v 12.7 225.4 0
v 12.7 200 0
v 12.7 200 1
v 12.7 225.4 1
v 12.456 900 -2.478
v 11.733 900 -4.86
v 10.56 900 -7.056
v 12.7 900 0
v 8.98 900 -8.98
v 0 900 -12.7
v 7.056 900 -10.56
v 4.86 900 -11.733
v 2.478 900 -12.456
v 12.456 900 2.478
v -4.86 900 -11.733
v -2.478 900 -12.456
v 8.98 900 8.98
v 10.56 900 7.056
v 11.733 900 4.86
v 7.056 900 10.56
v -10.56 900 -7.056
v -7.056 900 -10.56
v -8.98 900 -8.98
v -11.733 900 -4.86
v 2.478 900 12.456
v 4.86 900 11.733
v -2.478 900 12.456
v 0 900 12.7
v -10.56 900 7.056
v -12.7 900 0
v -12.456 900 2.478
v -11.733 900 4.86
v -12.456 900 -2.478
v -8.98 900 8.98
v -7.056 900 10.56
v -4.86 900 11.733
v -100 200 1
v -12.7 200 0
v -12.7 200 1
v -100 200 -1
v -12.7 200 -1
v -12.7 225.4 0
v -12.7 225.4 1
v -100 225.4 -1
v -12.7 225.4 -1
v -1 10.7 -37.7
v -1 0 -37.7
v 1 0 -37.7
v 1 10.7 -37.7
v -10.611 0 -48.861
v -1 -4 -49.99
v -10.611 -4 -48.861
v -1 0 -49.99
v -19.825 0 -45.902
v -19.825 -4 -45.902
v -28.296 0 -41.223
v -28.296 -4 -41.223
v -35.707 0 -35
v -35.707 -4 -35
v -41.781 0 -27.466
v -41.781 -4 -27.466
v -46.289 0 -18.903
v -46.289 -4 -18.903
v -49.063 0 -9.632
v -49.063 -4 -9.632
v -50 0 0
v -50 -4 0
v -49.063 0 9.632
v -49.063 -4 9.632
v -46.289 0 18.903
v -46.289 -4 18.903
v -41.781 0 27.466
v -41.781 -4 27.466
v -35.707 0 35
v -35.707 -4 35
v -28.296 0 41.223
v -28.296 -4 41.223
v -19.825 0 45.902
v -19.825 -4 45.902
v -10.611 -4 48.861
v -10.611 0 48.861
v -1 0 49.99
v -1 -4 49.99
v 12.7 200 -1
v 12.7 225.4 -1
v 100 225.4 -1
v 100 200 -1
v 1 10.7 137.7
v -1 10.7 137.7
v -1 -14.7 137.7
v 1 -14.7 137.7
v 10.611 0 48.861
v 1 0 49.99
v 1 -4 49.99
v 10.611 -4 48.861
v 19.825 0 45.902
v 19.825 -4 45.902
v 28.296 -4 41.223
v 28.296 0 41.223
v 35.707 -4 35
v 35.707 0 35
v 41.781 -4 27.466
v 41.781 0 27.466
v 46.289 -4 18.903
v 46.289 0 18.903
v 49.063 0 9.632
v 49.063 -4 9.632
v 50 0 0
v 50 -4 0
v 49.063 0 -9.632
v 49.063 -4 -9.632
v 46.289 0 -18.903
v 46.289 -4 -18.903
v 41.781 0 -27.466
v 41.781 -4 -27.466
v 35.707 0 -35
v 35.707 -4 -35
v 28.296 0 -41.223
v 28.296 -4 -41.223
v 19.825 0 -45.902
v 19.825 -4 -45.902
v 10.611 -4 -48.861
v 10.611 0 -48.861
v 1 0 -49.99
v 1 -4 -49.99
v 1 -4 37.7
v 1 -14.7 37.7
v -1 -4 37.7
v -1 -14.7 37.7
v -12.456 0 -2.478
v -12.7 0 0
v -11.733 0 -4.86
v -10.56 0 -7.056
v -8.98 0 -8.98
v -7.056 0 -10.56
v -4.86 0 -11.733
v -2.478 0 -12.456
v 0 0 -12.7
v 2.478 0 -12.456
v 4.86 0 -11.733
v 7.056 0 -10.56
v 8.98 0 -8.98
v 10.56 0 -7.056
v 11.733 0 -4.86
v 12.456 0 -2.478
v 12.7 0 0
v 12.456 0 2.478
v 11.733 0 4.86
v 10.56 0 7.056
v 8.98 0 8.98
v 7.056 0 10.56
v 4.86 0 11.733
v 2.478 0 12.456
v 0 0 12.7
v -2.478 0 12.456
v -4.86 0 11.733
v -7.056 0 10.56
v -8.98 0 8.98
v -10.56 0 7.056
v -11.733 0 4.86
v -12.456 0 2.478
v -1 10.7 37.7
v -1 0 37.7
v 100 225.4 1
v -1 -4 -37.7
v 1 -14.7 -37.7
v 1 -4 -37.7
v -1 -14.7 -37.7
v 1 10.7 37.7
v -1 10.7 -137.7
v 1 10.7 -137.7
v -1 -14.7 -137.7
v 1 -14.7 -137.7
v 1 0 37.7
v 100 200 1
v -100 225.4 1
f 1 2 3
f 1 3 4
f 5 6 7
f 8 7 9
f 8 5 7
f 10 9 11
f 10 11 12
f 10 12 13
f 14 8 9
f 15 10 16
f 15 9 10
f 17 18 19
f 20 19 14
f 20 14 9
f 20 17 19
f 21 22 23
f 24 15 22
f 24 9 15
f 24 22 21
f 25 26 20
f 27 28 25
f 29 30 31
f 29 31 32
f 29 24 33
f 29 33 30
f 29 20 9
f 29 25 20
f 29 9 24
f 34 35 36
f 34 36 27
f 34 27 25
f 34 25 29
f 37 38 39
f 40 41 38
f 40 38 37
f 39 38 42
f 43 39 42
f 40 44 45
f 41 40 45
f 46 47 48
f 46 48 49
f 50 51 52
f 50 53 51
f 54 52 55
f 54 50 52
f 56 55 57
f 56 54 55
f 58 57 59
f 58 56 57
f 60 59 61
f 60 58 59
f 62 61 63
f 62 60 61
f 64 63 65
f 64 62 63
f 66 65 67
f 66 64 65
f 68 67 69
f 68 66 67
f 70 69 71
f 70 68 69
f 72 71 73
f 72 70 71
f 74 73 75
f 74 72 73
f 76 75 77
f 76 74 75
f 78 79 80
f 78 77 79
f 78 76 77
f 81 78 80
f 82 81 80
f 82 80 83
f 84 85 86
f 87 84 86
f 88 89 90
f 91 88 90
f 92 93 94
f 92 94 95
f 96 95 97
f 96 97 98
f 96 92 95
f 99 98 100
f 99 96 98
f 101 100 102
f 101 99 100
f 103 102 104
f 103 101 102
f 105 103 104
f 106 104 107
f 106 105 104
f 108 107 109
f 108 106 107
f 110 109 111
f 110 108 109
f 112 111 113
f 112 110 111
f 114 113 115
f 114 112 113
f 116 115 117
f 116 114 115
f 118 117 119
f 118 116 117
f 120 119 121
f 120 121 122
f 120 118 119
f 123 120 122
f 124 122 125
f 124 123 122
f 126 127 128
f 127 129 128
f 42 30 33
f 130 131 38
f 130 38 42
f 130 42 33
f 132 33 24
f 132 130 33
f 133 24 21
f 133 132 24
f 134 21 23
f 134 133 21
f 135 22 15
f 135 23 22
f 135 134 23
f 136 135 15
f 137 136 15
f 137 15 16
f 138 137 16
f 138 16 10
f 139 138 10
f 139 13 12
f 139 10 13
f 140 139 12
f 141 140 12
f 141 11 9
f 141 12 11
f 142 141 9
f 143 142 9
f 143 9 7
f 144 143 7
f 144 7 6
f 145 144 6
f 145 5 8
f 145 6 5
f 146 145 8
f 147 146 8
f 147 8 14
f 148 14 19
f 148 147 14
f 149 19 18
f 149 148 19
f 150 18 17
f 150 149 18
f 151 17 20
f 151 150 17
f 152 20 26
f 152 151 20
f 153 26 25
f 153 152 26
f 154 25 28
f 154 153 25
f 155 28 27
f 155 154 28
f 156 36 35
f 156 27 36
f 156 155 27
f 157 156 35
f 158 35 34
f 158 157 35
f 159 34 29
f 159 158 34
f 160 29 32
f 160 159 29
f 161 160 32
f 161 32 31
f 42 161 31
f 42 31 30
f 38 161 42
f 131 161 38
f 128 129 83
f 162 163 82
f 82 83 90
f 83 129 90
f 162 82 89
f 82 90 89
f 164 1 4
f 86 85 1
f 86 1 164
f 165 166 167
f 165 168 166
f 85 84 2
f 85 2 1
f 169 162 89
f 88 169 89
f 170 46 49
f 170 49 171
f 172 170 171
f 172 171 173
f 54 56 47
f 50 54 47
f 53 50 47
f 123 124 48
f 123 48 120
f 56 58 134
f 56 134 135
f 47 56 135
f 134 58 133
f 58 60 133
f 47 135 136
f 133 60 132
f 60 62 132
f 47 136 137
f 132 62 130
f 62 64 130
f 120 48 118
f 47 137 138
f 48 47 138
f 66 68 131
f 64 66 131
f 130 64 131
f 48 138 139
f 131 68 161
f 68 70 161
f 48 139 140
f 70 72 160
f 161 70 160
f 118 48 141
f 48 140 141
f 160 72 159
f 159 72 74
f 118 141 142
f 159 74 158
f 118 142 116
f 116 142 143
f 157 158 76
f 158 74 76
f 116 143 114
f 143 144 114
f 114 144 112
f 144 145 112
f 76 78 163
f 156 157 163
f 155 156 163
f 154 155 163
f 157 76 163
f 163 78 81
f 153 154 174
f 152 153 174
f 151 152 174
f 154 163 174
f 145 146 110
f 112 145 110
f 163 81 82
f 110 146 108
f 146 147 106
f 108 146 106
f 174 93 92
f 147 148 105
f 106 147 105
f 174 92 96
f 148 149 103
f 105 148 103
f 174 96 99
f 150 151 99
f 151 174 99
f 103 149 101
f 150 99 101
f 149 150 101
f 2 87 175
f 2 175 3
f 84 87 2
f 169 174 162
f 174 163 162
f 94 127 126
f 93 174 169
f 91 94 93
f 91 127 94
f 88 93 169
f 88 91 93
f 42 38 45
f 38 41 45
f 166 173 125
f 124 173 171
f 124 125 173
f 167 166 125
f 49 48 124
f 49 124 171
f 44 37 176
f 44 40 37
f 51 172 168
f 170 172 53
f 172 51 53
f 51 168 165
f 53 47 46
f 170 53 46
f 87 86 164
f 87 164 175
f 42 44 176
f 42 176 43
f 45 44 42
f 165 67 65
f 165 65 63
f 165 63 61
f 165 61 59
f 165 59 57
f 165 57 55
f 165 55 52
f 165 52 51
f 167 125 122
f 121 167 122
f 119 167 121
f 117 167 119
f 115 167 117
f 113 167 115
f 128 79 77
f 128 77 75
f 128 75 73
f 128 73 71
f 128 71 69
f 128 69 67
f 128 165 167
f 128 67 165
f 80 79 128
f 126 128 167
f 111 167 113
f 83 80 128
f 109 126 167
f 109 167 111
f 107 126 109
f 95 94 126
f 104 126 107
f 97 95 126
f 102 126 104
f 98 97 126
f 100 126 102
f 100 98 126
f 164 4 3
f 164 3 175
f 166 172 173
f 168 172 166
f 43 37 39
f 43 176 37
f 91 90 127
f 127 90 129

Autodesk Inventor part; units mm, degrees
ref_plane "YZ Plane" through (0, 0, 0) normal (1, 0, 0) x (0, 1, 0)
ref_plane "XZ Plane" through (0, 0, 0) normal (0, 1, 0) x (-1, 0, 0)
ref_plane "XY Plane" through (0, 0, 0) normal (0, 0, 1) x (1, 0, 0)
sketch "Sketch1" plane through (0, 0, 0) normal (0, 1, 0) x (-1, 0, 0)
  circle A0 centre (0, 0) radius 12.7
  dimension "d0" = 25.4
extrude "Extrusion1" add sketch "Sketch1" along normal blind 900
sketch "Sketch2" plane through (0, 0, 0) normal (0, -1, 0) x (1, 0, 0)
  circle A0 centre (0, 0) radius 50
  dimension "d3" = 100
extrude "Extrusion2" add sketch "Sketch2" along normal blind 4
sketch "Sketch3" plane through (0, 0, 0) normal (1, 0, 0) x (0, 1, 0)
  line L0 (0, 50) -> (0, -50) projected
  line L1 (-4, 50) -> (-4, -50) projected
  line L2 (-14.7, -37.7) -> (10.7, -37.7)
  line L3 (10.7, -37.7) -> (10.7, -137.7)
  line L4 (10.7, -137.7) -> (-14.7, -137.7)
  line L5 (-14.7, -137.7) -> (-14.7, -37.7)
  line L6 (0, -12.7) -> (900, -12.7) projected
  line L7 (0, 12.7) -> (900, 12.7) projected
  line L8 (0, 0) -> (76.0488, 0) construction
  line L9 (-14.7, 37.7) -> (10.7, 37.7)
  line L10 (10.7, 37.7) -> (10.7, 137.7)
  line L11 (10.7, 137.7) -> (-14.7, 137.7)
  line L12 (-14.7, 137.7) -> (-14.7, 37.7)
  dimension "d6" = 100
  dimension "d7" = 25
  dimension "d8" = 25.4
  dimension "d9" = 10.7
extrude "Extrusion3" add sketch "Sketch3" along normal mid plane 2 contours L9 L12 L11 L10 | L2 L3 L4 L5
sketch "Sketch4" plane through (0, 0, 0) normal (0, 0, 1) x (1, 0, 0)
  line L0 (-100, 225.4) -> (100, 225.4)
  line L1 (100, 225.4) -> (100, 200)
  line L2 (100, 200) -> (-100, 200)
  line L3 (-100, 200) -> (-100, 225.4)
  line L4 (-12.7, 0) -> (-12.7, 900) projected
  line L5 (12.7, 0) -> (12.7, 900) projected
  line L6 (1, 0) -> (50, 0) projected
  point P0 (0, 0)
  point P1 (12.7, 225.4)
  point P2 (12.7, 200)
  point P3 (-12.7, 200)
  point P4 (-12.7, 225.4)
  dimension "d12" = 25.4
  dimension "d13" = 200
  dimension "d14" = 87.3
  dimension "d15" = 87.3
  dimension "d16" = 200
extrude "Extrusion4" add sketch "Sketch4" along normal mid plane 2 contours L0 L4 L2 L3 | L0 L1 L2 L5
properties part number "Mixer_1"
